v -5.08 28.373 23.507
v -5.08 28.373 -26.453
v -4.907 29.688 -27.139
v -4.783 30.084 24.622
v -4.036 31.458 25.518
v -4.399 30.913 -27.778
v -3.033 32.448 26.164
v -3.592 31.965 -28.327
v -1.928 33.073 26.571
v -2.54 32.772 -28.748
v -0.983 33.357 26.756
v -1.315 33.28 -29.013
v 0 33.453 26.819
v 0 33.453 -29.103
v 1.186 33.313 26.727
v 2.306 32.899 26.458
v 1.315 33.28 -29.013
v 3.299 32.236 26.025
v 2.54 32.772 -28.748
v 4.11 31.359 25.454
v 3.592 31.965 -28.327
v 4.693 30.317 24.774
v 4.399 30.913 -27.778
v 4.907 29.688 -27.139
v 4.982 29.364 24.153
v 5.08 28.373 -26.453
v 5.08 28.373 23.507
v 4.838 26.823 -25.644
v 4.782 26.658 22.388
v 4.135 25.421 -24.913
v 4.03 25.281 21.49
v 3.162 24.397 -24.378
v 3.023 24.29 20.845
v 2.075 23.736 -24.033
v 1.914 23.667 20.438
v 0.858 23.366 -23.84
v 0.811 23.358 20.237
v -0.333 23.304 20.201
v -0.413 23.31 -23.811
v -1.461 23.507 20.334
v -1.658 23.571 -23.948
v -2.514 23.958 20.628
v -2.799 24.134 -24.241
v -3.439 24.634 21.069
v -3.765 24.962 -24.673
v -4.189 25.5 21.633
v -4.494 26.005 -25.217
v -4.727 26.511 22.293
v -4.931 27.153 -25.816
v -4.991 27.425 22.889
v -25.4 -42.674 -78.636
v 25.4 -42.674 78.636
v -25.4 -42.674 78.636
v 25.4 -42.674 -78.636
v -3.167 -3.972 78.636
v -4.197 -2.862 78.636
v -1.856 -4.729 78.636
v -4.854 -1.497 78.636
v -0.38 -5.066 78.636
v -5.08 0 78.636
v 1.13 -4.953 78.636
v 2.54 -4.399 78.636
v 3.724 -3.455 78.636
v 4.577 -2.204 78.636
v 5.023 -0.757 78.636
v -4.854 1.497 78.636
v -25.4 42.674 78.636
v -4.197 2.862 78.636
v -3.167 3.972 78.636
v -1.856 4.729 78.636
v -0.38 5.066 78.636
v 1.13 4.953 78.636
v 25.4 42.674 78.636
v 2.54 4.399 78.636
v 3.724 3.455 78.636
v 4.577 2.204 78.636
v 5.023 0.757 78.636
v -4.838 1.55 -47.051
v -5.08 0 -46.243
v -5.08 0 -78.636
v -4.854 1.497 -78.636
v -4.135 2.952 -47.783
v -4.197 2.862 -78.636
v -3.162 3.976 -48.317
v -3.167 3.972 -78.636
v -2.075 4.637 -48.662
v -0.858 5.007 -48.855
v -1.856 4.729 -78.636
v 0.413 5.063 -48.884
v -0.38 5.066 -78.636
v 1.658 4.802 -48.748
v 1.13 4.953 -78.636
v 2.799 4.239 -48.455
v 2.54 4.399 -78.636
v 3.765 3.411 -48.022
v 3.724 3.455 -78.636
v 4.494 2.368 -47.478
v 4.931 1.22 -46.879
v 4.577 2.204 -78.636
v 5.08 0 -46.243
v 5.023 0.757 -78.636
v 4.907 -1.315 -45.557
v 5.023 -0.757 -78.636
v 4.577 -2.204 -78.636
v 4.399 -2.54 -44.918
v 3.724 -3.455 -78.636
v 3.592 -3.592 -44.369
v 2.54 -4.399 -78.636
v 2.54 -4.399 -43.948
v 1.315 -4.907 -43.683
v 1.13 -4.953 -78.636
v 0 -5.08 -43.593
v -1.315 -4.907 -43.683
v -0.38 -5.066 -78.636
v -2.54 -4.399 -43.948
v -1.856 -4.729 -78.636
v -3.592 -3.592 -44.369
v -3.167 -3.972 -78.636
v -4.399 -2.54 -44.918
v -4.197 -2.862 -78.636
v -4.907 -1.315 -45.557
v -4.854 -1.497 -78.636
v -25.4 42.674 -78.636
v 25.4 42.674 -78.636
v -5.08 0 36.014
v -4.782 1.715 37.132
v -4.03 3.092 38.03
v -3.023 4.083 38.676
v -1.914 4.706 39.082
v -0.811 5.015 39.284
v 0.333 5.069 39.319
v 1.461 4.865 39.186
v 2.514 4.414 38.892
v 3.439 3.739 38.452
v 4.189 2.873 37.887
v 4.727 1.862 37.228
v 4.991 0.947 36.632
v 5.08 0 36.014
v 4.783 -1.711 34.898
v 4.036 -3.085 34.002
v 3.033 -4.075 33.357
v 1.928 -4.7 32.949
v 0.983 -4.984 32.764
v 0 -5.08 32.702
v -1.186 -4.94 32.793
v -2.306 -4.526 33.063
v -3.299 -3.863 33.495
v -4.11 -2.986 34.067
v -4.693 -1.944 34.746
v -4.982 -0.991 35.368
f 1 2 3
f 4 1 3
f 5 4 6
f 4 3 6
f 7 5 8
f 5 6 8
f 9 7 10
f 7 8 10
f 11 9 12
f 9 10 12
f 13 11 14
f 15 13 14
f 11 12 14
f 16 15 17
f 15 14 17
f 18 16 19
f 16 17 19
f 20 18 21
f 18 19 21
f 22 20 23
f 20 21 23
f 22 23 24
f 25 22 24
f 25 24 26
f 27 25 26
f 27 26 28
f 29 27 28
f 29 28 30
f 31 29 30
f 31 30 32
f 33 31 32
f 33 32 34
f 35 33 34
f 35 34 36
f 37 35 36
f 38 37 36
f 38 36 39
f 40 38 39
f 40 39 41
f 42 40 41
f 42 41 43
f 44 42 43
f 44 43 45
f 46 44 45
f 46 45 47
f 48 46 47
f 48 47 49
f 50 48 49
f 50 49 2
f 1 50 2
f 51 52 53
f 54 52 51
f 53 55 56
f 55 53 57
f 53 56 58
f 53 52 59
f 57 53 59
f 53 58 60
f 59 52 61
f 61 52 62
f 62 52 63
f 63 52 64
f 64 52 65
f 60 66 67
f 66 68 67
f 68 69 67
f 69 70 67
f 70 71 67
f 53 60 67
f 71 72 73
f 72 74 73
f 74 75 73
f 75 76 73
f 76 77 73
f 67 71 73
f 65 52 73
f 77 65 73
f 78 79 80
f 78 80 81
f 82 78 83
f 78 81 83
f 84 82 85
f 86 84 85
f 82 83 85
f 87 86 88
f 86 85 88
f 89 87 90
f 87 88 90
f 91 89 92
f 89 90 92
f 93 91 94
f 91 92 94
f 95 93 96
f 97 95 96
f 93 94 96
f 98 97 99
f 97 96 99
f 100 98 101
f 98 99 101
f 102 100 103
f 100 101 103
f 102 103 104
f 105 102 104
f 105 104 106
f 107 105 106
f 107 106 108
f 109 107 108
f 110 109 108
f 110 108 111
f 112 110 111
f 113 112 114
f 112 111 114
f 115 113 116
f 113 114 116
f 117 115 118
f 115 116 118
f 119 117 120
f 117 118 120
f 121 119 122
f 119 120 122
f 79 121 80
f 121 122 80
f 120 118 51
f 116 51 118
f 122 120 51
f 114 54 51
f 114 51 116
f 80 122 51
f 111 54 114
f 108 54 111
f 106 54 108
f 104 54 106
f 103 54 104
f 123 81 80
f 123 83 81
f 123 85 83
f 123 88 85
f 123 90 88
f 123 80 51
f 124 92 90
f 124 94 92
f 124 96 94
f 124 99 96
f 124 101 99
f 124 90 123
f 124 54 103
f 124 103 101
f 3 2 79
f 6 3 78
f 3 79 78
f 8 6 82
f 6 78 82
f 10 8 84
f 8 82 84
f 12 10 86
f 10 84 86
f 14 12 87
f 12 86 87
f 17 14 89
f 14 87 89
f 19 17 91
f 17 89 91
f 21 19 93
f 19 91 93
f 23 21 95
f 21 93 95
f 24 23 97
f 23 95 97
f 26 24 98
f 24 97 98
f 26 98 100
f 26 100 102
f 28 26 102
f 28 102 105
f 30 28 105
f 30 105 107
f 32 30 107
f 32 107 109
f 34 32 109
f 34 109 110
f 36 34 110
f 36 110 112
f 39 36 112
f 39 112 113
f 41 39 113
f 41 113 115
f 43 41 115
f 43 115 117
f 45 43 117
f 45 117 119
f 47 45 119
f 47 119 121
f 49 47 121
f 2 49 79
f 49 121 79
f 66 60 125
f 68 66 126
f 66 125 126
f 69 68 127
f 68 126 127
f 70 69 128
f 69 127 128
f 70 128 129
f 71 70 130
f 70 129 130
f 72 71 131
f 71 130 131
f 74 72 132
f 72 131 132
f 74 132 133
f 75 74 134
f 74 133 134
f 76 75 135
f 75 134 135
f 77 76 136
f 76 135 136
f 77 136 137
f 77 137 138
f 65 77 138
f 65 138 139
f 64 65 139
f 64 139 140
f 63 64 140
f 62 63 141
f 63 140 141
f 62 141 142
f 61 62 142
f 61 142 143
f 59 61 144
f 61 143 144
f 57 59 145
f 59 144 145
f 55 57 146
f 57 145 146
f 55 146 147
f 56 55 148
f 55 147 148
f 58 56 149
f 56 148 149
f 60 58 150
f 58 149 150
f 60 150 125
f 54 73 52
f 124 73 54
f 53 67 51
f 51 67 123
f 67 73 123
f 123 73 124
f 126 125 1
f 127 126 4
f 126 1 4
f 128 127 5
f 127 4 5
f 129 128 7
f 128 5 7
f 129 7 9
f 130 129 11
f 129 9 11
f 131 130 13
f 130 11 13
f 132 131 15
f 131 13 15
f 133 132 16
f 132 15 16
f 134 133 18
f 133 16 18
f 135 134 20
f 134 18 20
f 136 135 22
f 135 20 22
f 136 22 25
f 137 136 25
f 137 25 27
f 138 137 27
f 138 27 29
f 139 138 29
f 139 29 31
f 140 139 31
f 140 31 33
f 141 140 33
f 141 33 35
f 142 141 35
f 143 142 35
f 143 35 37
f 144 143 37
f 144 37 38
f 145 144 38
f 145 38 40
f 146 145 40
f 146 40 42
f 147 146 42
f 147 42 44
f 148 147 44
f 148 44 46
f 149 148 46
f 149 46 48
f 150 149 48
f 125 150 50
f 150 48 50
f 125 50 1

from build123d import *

# Parameters (mm, degrees)
SKETCH1_W            = 157.271841604
SKETCH1_H            = 85.34874331
BOSS_EXTRUDE1_DEPTH  = 25.4
CUT_SWEEP2_PROFILE_R = 5.08


with BuildPart() as part:
    # Sketch1 → Boss-Extrude1 (new, symmetric)
    with BuildSketch(Plane(origin=(0, 0, 0), x_dir=(0, 0, -1), z_dir=(1, 0, 0))):
        Rectangle(SKETCH1_W, SKETCH1_H)
    extrude(amount=BOSS_EXTRUDE1_DEPTH, both=True)

    # Cut-Sweep2: sweep along a path in Sketch11
    with BuildLine(Plane(origin=(0, 0, 0), x_dir=(0, 0, -1), z_dir=(1, 0, 0))) as cut_sweep2_path:
        Line((-86.885944584, 0), (-36.013867587, 0))
        Line((-36.013867587, 0), (-23.506619997, 28.372870033))
        Line((-23.506619997, 28.372870033), (26.452653889, 28.372870033))
        Line((26.452653889, 28.372870033), (46.242947448, 0))
        Line((46.242947448, 0), (78.869898607, 0))
    # Cut-Sweep2 profile (on start of the path) → Cut-Sweep2 (sweep, cut)
    with BuildSketch(Plane(origin=(0, 0, 86.885944584), x_dir=(-1, 0, 0), z_dir=(0, 0, -1))):
        Circle(CUT_SWEEP2_PROFILE_R)
    sweep(path=cut_sweep2_path.line, transition=Transition.RIGHT, mode=Mode.SUBTRACT)


solid = part.part
